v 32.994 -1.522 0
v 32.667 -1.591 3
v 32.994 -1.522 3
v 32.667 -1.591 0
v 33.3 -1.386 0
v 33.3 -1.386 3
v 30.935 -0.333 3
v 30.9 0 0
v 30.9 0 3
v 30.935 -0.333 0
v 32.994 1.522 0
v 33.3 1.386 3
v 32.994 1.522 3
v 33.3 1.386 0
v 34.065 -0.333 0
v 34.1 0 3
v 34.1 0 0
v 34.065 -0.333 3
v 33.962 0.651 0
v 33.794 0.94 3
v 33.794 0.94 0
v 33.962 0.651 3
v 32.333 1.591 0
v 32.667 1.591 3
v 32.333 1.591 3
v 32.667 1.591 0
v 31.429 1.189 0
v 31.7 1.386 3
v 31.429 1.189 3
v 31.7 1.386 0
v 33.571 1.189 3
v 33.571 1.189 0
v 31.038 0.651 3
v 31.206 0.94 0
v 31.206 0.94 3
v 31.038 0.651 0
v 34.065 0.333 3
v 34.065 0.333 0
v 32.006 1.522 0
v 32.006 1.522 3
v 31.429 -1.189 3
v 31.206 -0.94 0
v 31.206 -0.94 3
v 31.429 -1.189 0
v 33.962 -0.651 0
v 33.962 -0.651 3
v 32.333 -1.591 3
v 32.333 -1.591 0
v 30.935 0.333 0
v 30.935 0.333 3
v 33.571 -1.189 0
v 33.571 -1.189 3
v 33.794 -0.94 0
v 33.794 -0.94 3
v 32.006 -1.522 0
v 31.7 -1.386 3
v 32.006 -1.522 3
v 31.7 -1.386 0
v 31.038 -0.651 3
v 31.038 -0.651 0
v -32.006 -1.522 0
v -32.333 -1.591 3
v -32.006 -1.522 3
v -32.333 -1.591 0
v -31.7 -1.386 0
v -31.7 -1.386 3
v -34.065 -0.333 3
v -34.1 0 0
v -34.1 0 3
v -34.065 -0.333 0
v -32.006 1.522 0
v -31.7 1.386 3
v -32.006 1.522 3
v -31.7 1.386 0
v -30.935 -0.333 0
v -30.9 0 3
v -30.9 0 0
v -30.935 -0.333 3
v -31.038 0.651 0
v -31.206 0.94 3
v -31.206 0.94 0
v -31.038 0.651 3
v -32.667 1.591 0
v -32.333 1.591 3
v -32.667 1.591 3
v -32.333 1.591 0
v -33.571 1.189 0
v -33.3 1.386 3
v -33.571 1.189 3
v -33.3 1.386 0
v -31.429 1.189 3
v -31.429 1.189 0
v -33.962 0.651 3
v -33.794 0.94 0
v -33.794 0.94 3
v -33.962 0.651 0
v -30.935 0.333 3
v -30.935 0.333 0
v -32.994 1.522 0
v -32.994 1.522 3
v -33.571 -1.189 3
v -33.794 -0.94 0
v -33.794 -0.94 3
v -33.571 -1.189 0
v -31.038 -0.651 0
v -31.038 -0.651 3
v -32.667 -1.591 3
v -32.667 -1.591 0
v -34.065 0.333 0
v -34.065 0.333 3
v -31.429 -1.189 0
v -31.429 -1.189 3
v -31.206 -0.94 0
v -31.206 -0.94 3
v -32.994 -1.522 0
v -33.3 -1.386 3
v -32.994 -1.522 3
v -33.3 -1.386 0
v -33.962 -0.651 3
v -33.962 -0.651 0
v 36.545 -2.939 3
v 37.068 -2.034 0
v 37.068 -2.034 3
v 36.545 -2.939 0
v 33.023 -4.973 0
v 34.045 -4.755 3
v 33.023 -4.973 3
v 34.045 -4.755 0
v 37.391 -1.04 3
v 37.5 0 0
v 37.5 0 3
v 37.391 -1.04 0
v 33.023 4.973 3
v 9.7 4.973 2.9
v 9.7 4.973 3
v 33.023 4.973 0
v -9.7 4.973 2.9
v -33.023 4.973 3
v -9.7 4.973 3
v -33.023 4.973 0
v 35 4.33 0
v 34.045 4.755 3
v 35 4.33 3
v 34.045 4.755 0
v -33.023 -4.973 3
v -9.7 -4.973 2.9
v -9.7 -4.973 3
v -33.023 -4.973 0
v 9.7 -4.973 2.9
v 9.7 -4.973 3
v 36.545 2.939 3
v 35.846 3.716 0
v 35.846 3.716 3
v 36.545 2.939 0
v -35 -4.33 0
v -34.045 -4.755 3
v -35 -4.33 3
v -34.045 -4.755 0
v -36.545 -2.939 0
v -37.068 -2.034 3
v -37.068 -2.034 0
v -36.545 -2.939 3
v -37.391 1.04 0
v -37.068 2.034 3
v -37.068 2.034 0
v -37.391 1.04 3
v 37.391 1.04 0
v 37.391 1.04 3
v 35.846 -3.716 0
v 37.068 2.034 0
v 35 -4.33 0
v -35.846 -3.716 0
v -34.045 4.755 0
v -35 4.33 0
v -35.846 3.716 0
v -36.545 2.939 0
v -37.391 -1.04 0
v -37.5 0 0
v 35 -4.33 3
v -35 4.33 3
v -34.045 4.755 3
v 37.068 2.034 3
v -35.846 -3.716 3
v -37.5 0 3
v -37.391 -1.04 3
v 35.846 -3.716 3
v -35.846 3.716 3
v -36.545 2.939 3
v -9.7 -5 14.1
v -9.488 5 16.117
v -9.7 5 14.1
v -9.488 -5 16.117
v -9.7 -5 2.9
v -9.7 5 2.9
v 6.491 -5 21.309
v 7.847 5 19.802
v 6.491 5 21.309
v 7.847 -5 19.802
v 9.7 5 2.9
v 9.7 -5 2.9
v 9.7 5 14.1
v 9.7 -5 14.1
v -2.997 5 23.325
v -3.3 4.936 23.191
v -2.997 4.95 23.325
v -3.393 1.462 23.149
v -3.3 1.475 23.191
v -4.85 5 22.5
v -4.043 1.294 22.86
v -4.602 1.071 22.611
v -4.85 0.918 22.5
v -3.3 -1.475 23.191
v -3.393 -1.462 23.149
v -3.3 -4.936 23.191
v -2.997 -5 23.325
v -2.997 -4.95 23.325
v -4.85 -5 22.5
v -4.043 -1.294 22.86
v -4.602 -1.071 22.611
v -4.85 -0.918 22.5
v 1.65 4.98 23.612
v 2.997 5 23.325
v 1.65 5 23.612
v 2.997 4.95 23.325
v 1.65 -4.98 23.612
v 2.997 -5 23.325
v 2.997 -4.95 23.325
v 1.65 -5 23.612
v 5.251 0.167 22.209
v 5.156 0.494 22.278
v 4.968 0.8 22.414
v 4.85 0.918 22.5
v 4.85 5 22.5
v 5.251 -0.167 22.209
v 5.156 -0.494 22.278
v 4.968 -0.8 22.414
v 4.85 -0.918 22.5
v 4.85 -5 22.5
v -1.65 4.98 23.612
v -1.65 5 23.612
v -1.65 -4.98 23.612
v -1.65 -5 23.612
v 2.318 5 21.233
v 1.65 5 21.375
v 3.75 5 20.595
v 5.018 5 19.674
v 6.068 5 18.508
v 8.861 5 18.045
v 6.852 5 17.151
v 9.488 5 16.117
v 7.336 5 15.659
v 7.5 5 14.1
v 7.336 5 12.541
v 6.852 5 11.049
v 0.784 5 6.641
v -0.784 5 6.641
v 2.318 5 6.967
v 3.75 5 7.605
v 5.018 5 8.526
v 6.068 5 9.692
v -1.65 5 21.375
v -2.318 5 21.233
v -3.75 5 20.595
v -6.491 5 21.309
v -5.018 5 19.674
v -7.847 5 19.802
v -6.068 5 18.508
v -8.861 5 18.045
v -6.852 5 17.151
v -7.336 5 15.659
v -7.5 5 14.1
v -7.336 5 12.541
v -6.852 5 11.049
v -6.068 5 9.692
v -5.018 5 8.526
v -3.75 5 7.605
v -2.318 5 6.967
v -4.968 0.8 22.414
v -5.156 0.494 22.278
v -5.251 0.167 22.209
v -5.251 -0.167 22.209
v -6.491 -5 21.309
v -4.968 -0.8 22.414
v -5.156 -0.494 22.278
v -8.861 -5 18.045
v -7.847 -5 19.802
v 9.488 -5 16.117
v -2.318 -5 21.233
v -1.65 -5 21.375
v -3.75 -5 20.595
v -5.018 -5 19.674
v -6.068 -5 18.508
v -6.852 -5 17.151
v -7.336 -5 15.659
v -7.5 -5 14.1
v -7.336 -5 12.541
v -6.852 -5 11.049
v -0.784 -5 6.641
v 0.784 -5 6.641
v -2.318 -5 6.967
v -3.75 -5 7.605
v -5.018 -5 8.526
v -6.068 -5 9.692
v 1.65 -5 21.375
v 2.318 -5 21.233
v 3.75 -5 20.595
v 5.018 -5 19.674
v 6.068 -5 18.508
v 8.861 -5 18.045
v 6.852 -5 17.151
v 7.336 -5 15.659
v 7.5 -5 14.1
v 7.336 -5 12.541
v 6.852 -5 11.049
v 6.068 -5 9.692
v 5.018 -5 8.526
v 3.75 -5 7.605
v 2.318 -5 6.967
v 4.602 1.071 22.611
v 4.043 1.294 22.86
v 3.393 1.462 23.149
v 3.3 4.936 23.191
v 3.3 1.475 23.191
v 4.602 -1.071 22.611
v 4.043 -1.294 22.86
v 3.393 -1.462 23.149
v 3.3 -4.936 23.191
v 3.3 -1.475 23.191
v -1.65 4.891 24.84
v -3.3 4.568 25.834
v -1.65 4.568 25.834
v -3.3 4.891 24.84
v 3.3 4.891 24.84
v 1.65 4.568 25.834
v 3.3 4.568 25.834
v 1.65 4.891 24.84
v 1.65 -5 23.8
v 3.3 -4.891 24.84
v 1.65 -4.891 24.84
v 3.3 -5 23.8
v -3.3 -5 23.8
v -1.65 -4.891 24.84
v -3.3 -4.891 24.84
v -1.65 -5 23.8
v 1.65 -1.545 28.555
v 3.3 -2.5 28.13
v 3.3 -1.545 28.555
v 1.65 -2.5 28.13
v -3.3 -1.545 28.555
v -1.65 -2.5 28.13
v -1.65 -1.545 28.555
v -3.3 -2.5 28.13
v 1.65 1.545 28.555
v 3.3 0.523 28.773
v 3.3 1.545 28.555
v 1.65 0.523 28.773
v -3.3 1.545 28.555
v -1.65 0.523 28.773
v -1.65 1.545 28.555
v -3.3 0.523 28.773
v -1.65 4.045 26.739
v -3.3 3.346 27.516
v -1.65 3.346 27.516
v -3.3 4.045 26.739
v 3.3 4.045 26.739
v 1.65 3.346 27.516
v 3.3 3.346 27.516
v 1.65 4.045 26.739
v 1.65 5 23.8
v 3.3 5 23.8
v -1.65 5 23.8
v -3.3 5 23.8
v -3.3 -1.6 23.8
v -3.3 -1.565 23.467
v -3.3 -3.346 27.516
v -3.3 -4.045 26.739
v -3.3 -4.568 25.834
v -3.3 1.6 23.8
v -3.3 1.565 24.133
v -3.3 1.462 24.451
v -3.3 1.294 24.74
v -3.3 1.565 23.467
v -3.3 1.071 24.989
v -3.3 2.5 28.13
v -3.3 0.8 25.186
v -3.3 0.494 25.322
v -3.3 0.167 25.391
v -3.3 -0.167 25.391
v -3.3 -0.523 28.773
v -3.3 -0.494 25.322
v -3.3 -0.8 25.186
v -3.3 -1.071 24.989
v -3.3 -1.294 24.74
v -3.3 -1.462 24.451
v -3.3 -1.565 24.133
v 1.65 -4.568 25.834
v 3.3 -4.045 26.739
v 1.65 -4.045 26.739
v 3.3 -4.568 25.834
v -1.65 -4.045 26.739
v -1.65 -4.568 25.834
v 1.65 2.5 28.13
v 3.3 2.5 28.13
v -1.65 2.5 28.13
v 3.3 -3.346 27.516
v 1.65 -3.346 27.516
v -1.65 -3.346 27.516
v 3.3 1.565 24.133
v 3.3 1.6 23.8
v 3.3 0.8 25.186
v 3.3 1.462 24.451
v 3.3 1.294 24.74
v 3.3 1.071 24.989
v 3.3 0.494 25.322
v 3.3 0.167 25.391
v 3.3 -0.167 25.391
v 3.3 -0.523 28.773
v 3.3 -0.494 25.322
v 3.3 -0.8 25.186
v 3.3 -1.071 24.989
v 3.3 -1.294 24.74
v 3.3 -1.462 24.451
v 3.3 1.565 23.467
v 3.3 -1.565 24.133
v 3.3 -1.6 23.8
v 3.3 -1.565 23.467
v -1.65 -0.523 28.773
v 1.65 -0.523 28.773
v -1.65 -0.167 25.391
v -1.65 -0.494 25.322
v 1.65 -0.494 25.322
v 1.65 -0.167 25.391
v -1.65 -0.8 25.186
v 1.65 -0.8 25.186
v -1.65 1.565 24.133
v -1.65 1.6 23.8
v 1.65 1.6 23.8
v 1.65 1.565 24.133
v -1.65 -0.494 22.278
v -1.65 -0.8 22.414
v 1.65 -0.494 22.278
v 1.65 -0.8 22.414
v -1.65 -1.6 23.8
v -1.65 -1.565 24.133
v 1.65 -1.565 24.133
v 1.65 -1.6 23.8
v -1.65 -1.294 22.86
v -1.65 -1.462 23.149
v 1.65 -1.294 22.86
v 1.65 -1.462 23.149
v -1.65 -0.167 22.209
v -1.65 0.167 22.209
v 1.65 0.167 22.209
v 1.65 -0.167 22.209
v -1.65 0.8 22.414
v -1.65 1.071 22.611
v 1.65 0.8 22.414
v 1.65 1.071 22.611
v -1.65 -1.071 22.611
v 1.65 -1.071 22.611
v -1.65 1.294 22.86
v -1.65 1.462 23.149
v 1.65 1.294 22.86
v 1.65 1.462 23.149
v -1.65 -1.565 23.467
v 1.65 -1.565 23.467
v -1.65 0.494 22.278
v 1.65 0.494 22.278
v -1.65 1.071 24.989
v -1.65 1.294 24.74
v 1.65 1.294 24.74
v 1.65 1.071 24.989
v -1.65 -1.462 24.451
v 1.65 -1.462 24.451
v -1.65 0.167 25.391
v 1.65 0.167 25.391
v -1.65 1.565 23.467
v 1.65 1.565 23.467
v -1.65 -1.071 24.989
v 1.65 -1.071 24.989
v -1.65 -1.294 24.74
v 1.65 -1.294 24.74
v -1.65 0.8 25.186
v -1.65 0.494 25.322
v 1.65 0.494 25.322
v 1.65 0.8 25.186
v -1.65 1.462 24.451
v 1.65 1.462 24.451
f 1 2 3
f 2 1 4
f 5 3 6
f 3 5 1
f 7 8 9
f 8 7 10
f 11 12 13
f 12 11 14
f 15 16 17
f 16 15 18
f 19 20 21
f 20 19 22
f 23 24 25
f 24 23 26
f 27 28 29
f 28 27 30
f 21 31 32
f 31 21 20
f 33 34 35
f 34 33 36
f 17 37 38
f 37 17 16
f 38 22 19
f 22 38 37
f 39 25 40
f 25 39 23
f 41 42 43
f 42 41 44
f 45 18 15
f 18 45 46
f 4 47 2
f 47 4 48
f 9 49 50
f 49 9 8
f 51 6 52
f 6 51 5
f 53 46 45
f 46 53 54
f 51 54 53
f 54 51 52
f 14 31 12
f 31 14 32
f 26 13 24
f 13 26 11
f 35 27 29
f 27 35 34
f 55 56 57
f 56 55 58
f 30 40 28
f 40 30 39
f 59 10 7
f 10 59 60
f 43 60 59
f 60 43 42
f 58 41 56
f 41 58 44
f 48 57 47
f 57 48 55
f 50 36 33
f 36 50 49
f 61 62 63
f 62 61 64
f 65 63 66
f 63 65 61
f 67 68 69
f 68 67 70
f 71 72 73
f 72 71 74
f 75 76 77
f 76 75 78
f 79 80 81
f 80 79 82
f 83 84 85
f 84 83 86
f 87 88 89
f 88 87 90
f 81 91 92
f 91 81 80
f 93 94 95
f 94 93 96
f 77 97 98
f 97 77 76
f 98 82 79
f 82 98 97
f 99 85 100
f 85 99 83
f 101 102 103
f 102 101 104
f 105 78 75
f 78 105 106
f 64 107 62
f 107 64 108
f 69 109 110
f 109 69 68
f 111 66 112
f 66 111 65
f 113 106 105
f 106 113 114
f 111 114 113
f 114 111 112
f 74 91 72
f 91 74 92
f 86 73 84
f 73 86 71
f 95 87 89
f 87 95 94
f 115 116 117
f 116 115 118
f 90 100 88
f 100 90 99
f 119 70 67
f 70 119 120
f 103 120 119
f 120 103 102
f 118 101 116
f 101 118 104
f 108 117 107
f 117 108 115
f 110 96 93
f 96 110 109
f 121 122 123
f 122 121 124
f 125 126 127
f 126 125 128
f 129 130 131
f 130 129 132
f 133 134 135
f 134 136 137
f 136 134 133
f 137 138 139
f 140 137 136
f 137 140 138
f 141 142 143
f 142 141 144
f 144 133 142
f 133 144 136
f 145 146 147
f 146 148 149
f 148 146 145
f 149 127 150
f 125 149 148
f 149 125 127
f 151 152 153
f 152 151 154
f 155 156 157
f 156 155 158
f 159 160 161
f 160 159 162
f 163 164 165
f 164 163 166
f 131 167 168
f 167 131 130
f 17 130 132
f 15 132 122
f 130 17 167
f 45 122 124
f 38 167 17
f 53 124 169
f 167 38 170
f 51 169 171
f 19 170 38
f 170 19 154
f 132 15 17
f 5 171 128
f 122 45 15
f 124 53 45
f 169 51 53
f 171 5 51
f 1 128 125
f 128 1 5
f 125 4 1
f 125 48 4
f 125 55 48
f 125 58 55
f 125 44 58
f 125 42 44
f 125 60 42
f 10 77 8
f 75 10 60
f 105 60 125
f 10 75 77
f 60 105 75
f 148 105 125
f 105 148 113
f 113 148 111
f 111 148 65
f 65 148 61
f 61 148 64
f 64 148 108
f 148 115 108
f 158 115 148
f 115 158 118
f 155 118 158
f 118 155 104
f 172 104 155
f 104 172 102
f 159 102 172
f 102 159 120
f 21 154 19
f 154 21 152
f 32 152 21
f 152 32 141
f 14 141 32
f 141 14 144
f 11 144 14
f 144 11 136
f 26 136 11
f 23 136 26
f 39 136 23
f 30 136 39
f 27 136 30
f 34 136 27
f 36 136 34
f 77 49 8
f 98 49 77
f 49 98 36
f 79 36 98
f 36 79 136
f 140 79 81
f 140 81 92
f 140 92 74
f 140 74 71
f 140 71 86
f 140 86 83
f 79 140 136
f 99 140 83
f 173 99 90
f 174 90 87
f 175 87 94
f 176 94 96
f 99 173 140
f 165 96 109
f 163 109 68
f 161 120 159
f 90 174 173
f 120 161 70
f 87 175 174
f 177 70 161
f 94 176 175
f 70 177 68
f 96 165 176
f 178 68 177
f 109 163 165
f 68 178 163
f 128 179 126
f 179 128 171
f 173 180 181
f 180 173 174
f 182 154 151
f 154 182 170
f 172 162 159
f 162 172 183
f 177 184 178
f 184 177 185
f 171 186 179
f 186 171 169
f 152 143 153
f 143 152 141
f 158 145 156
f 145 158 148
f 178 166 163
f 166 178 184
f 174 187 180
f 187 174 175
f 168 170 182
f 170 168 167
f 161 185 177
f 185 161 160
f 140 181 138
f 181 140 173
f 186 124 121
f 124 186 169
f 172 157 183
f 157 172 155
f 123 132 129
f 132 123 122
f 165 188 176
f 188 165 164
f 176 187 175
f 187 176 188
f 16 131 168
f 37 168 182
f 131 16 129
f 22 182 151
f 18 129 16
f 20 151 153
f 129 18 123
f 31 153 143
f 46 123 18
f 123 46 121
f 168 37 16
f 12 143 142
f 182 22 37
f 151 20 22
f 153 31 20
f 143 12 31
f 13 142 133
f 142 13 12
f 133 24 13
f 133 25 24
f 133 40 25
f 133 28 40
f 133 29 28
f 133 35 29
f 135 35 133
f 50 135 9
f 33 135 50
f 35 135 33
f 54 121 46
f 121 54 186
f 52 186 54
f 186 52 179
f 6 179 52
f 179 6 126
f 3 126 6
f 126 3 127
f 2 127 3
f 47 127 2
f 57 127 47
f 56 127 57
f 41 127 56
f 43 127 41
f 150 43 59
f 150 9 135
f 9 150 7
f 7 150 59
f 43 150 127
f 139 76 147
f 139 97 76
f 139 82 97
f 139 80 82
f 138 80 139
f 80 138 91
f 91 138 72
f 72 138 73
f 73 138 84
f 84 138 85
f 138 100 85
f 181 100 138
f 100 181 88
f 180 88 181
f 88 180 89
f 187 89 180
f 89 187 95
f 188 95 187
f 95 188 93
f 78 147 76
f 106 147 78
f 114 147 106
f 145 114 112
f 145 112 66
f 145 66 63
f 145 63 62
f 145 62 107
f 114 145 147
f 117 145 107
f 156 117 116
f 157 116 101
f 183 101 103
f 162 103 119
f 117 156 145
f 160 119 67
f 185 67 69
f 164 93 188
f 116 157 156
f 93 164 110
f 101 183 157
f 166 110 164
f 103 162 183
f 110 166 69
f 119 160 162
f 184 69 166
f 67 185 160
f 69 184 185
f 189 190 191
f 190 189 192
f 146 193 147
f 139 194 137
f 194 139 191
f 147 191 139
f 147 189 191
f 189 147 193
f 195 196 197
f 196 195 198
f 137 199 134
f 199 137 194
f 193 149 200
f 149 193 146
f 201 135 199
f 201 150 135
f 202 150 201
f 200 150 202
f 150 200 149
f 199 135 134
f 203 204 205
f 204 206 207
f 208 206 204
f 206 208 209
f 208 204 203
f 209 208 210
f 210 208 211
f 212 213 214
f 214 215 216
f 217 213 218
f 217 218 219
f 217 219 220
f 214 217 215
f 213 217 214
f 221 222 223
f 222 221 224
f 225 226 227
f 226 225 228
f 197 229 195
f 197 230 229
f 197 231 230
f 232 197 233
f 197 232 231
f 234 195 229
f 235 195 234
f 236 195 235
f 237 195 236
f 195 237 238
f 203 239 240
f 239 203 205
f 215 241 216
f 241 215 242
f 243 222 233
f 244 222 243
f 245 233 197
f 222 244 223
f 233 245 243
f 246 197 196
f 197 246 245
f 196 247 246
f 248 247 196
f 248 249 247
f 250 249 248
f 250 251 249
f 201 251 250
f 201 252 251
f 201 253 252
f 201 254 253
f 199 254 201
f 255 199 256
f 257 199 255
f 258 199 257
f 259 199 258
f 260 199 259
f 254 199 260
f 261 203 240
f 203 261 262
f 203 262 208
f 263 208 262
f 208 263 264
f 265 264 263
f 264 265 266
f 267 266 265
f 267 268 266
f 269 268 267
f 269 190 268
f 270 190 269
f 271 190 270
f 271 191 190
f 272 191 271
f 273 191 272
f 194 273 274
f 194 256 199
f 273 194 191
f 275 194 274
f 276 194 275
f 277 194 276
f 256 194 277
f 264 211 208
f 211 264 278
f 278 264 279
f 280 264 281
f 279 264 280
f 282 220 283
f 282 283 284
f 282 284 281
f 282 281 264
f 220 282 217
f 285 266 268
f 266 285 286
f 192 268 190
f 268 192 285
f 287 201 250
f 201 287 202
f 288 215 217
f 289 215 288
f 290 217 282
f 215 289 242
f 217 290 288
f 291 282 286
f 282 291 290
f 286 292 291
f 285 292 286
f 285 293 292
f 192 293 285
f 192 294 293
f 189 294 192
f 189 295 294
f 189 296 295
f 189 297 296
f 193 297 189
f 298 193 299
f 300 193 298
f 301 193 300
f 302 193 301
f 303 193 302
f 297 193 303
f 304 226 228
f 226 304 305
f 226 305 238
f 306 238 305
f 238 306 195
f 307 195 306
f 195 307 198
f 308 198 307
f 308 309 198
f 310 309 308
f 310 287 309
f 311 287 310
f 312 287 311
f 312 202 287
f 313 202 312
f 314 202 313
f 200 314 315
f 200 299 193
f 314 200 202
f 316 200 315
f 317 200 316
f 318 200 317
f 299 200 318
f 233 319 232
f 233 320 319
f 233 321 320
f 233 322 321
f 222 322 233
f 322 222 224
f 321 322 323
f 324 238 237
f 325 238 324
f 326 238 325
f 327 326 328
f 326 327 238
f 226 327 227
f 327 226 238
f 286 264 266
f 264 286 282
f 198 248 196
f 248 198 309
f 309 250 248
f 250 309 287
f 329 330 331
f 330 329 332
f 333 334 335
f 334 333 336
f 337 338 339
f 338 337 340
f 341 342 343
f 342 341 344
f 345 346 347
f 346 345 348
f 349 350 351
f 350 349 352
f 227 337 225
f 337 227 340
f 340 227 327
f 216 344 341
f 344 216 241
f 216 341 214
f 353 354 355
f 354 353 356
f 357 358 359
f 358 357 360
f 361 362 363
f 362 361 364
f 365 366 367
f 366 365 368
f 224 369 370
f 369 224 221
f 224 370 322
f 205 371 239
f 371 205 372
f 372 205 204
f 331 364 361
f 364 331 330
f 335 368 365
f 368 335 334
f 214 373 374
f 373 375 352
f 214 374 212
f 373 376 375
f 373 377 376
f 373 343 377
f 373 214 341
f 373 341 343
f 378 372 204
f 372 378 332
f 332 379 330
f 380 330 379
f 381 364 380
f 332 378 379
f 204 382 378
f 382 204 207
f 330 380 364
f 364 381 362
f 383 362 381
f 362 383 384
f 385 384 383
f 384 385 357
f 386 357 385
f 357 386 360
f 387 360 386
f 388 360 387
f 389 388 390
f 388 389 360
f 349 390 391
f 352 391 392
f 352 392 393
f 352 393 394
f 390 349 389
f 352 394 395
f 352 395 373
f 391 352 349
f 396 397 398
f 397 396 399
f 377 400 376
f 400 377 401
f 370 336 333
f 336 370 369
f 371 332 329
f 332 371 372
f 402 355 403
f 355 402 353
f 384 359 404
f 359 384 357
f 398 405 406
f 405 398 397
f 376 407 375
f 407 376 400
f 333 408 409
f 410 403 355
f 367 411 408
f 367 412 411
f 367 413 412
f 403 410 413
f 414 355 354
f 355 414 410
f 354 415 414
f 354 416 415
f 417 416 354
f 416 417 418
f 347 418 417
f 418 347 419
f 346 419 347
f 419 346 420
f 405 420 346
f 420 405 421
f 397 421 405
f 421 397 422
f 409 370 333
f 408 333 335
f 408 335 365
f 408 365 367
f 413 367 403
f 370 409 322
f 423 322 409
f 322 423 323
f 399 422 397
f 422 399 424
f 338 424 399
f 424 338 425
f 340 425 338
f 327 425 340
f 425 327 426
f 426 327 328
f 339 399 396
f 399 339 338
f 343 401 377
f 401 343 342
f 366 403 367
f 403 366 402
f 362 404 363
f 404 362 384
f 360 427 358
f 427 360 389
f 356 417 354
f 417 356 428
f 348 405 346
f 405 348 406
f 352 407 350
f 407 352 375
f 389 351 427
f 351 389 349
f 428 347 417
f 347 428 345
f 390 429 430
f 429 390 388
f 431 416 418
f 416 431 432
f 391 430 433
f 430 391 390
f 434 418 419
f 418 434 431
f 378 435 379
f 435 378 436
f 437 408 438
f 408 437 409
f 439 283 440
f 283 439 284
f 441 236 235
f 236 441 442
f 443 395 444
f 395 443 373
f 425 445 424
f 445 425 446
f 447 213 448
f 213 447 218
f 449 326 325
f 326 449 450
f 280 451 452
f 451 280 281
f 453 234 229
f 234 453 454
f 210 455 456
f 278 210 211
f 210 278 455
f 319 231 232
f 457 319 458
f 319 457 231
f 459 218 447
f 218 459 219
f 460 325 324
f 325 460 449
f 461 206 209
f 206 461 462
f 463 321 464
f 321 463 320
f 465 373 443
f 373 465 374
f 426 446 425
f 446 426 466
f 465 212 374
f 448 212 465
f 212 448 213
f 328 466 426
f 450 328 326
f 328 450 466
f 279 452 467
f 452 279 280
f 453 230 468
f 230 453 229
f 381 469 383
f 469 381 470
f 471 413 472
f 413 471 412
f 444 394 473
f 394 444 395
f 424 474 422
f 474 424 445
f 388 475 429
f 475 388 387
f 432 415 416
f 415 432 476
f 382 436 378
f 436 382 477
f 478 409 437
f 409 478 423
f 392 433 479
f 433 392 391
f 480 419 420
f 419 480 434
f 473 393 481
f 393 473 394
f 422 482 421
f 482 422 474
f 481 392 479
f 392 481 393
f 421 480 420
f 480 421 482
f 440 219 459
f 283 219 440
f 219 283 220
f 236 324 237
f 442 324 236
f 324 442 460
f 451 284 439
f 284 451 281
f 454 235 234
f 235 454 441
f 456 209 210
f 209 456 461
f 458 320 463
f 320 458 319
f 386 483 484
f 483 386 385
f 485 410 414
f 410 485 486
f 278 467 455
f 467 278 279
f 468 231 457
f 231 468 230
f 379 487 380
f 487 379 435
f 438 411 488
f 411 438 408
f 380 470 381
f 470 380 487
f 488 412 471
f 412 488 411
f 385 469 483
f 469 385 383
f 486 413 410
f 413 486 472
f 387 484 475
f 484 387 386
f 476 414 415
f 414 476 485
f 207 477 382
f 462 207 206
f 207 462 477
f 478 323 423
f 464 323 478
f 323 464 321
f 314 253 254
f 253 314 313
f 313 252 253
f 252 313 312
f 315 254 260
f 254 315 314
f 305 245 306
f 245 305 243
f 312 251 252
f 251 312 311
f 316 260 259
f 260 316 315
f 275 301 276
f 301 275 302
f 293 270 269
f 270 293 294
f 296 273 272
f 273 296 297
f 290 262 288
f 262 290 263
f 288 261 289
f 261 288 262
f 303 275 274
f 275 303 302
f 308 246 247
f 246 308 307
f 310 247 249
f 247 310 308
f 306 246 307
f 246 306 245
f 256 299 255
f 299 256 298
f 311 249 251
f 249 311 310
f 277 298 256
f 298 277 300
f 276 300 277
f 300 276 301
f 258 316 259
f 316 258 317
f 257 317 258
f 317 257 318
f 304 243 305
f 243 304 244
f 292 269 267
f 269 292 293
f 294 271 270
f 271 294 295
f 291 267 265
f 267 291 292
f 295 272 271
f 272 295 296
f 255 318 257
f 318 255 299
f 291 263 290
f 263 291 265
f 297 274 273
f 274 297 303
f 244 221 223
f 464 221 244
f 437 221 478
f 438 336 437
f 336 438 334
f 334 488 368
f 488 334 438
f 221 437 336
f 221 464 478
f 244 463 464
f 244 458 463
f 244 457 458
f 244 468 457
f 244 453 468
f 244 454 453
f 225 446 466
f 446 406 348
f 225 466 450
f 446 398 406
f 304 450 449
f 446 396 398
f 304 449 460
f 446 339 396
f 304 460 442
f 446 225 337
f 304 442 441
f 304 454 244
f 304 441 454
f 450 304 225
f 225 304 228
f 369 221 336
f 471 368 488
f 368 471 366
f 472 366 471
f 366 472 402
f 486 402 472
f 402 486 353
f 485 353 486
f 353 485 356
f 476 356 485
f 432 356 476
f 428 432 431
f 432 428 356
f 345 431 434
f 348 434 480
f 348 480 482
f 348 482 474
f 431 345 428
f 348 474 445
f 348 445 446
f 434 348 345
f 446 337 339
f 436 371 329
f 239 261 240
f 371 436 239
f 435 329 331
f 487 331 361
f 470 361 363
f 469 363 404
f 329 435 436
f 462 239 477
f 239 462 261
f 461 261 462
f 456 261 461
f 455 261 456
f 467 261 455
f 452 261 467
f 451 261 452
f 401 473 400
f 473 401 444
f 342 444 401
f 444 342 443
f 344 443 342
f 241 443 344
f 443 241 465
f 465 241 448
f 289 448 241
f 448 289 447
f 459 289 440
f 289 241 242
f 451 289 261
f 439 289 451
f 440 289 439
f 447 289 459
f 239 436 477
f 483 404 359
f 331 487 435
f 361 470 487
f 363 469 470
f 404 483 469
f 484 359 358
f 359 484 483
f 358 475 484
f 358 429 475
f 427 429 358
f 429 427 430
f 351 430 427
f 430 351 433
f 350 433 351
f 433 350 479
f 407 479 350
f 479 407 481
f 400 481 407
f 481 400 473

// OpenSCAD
m3_head_clearance = 5.3;
m3_screw_clearance = 3.2;
$fn=30;

module m3_bolt(bolt_len) {
    head_len=5;
    translate([0,0,bolt_len/2]) cylinder(d=m3_screw_clearance,h=bolt_len+0.05,center=true);
    translate([0,0,-head_len/2]) cylinder(d=m3_head_clearance,h=head_len,center=true);
}

module bolts(hole_distance,bolt_len) {
    translate([hole_distance/2,0,0]) m3_bolt(bolt_len);
    translate([-hole_distance/2,0,0]) m3_bolt(bolt_len);
}

// clearance between bolthole center and belt
upper_clearance = 5.0;

// measured parameters
hole_distance = 65.0;
bolt_len = 15.0;

module simple_penholder(inner_d) {
    inner_clearance = 1.5;
    th = 2.2;
    translate([0,-(inner_d/2+th+inner_clearance),0])
    difference() {
        union() {
            hull() {
                cylinder(d=inner_d+(th*2),h=upper_clearance*2,center=true);
                translate([0,inner_d/2 + th + inner_clearance/2,0])
                cube([inner_d+(th*2), inner_clearance, upper_clearance*2],center=true);
            }
            translate([0,-inner_d/2 - th, 0])
            rotate(90,[0,1,0])
            cylinder(h=th*3,r=upper_clearance,center=true);
        }
        cylinder(d=inner_d,h=upper_clearance*2 + 1.0, center=true);
        rotate(90,[0,1,0])
        translate([0,-inner_d/2 -th,-15/2]) m3_bolt(15);
        translate([0,-inner_d,0])
        cube([th*1.5,inner_d*2,upper_clearance*2 + 1.0],center=true);
    }
}
    
    

module support(support_th) {
    difference() {
        hull() {
            translate([hole_distance/2,0,support_th/2])
                cylinder(r=upper_clearance,h=support_th,center=true);
            translate([-hole_distance/2,0,support_th/2])
                cylinder(r=upper_clearance,h=support_th,center=true);
        }
        translate([0,0,-0.05]) bolts(hole_distance, bolt_len);
    }
}

    
support(3);
rotate(-90,[1,0,0])
translate([0,-2.9,0]) simple_penholder(15);
